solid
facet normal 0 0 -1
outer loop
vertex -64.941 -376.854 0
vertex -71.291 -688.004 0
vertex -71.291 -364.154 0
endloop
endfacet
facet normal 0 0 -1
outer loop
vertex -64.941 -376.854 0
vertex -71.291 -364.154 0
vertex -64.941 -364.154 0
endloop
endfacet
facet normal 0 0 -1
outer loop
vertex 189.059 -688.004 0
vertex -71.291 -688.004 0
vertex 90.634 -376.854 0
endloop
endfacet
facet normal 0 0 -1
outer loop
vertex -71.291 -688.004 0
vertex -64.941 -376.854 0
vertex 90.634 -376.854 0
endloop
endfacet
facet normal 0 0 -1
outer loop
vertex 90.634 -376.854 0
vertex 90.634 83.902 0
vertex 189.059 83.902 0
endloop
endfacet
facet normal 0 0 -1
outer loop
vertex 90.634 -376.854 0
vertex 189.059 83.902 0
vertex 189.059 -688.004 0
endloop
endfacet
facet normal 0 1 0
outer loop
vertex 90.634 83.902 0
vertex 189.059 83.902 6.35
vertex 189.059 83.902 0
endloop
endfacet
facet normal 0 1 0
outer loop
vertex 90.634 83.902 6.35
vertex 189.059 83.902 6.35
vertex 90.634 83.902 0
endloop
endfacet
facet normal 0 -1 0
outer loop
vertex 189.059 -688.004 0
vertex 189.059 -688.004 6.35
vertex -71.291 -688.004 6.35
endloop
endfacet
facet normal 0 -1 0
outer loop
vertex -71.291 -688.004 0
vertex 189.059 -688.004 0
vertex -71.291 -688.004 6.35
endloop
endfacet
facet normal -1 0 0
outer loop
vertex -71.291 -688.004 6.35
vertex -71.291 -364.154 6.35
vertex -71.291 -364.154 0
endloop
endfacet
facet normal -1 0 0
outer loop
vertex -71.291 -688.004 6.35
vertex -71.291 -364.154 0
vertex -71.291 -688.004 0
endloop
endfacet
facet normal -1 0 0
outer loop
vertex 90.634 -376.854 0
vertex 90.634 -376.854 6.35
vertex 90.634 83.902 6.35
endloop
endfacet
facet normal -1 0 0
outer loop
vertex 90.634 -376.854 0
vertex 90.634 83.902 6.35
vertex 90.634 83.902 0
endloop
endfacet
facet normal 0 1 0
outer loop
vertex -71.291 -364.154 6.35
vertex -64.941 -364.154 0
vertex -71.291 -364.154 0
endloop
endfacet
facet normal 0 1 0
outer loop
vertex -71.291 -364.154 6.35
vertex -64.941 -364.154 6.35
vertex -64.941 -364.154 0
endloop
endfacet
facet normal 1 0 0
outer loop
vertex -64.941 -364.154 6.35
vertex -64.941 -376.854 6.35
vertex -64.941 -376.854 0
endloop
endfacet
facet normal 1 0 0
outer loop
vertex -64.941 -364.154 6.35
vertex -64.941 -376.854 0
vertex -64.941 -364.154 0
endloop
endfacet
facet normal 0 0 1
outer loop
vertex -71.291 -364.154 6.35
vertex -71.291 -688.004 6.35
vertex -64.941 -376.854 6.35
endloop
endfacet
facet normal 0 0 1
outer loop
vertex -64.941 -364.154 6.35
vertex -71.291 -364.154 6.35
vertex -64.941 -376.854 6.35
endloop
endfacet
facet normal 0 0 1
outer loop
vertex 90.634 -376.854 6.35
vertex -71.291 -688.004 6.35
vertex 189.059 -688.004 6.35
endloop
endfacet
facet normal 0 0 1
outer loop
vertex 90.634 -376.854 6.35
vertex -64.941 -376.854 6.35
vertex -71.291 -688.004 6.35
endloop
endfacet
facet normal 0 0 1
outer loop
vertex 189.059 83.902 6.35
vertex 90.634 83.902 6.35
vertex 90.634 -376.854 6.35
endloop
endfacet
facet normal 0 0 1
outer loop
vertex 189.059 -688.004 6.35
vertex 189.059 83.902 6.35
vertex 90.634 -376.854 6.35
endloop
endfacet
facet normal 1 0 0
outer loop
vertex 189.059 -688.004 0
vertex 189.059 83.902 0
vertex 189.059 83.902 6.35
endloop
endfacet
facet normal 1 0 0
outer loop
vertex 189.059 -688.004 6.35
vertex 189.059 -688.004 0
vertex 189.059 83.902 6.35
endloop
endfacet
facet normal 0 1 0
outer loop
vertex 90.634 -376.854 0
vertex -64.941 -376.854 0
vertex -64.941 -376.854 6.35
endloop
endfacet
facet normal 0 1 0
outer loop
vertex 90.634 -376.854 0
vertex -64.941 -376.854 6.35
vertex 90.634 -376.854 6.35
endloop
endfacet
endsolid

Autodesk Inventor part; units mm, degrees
ref_plane "YZ Plane" through (0, 0, 0) normal (1, 0, 0) x (0, 1, 0)
ref_plane "XZ Plane" through (0, 0, 0) normal (0, 1, 0) x (-1, 0, 0)
ref_plane "XY Plane" through (0, 0, 0) normal (0, 0, 1) x (1, 0, 0)
sketch "Sketch1" plane through (0, 0, 0) normal (0, 0, 1) x (1, 0, 0)
  line L0 (-64.9406, 96.6023) -> (189.0594, 96.6023)
  line L1 (189.0594, 96.6023) -> (189.0594, -792.3977)
  line L2 (189.0594, -792.3977) -> (-64.9406, -792.3977)
  line L3 (-64.9406, -792.3977) -> (-64.9406, 96.6023)
  line L4 (-64.9406, 96.6023) -> (87.4594, 96.6023)
  line L5 (87.4594, 96.6023) -> (87.4594, -364.1537)
  line L6 (87.4594, -364.1537) -> (-64.9406, -364.1537)
  line L7 (-64.9406, -364.1537) -> (-64.9406, 96.6023)
  point P0 (0, 0)
  dimension "d0" = 254
  dimension "d1" = 889
  dimension "d2" = 152.4
  dimension "d3" = 460.756
extrude "Extrusion1" add sketch "Sketch1" along normal blind 6.35 contours L0 L1 L2 L3 L6 L5
sketch "Sketch2" plane through (-64.9406, -792.3977, 0) normal (-1, 0, 0) x (0, 0, 1)
  line L0 (6.35, 428.244) -> (0, 428.244) projected
  line L1 (0, 428.244) -> (0, 0) projected
  line L2 (0, 0) -> (6.35, 0) projected
  line L3 (6.35, 0) -> (6.35, 428.244) projected
  point P0 (0, 792.3977)
extrude "Extrusion2" add sketch "Sketch2" along normal blind 6.35
sketch "Sketch3" plane through (0, 0, 6.35) normal (0, 0, 1) x (1, 0, 0)
  line L0 (87.4594, 96.6023) -> (189.0594, 96.6023) projected
  line L1 (87.4594, -364.1537) -> (90.6344, -364.1537)
  line L2 (90.6344, -364.1537) -> (90.6344, 96.6023)
  line L3 (90.6344, 96.6023) -> (87.4594, 96.6023)
  line L4 (87.4594, 96.6023) -> (87.4594, -364.1537)
  point P0 (0, 0)
  dimension "d8" = 3.175
extrude "Extrusion3" cut sketch "Sketch3" against normal blind 6.35
sketch "Sketch4" plane through (189.0594, 96.6023, 6.35) normal (0, 1, 0) x (1, 0, 0)
  line L0 (-98.425, 6.35) -> (-98.425, 0) projected
  line L1 (-98.425, 0) -> (0, 0) projected
  line L2 (0, 6.35) -> (0, 0) projected
  line L3 (0, 6.35) -> (-98.425, 6.35) projected
  point P0 (-189.0594, 6.35)
extrude "Extrusion4" add sketch "Sketch4" along normal blind 6.35
sketch "Sketch5" plane through (189.0594, 102.9523, 6.35) normal (0, 1, 0) x (1, 0, 0)
  line L0 (-98.425, 6.35) -> (0, 6.35) projected
  line L1 (-98.425, 0) -> (-98.425, 6.35) projected
  line L2 (0, 0) -> (-98.425, 0) projected
  line L3 (0, 6.35) -> (0, 0) projected
  point P0 (-189.0594, 6.35)
extrude "Extrusion5" cut sketch "Sketch5" against normal blind 6.35
sketch "Sketch6" plane through (189.0594, 96.6023, 6.35) normal (0, 1, 0) x (1, 0, 0)
  line L0 (-98.425, 0) -> (-98.425, 6.35) projected
  line L1 (0, 0) -> (-98.425, 0) projected
  line L2 (0, 6.35) -> (0, 0) projected
  line L3 (-98.425, 6.35) -> (0, 6.35) projected
  point P0 (-189.0594, 6.35)
extrude "Extrusion6" add sketch "Sketch6" along normal blind 6.35
sketch "Sketch7" plane through (0, 0, 6.35) normal (0, 0, 1) x (1, 0, 0)
  line L0 (90.6344, -364.1537) -> (-71.2906, -364.1537) projected
  line L1 (-71.2906, -364.1537) -> (-71.2906, -792.3977) projected
  line L2 (189.0594, -792.3977) -> (-71.2906, -792.3977) projected
  line L3 (189.0594, 102.9523) -> (189.0594, -792.3977) projected
  line L4 (189.0594, 102.9523) -> (90.6344, 102.9523) projected
  line L5 (0, -364.1537) -> (0, -688.0037)
  line L6 (0, -688.0037) -> (-71.2906, -688.0037)
  line L7 (0, -688.0037) -> (189.0594, -688.0037)
  point P0 (0, 0)
  dimension "d17" = 323.85
extrude "Extrusion7" cut sketch "Sketch7" against normal blind 25.4 contours L7 L3 L2 L1 L6
sketch "Sketch8" plane through (0, 0, 0) normal (0, 0, -1) x (-1, 0, 0)
  line L0 (71.2906, -688.0037) -> (71.2906, -364.1537) projected
  line L1 (-90.6344, -364.1537) -> (71.2906, -364.1537)
  line L2 (71.2906, -364.1537) -> (71.2906, -376.8537)
  line L3 (71.2906, -376.8537) -> (-90.6344, -376.8537)
  line L4 (-90.6344, -376.8537) -> (-90.6344, -364.1537)
  point P0 (0, 0)
  dimension "d20" = 12.7
extrude "Extrusion8" cut sketch "Sketch8" against normal blind 25.4
sketch "Sketch9" plane through (0, 0, 6.35) normal (0, 0, 1) x (1, 0, 0)
  line L0 (-71.2906, -376.8537) -> (-64.9406, -376.8537)
  line L1 (-64.9406, -376.8537) -> (-64.9406, -364.1537)
  line L2 (-64.9406, -364.1537) -> (-71.2906, -364.1537)
  line L3 (-71.2906, -364.1537) -> (-71.2906, -376.8537)
  point P0 (0, 0)
  dimension "d23" = 6.35
  dimension "d24" = 12.7
extrude "Extrusion9" add sketch "Sketch9" against normal blind 6.35
sketch "Sketch10" plane through (0, 0, 6.35) normal (0, 0, 1) x (1, 0, 0)
  line L0 (189.0594, 102.9523) -> (189.0594, -688.0037) projected
  line L1 (189.0594, 102.9523) -> (90.6344, 102.9523) projected
  line L2 (90.6344, 102.9523) -> (189.0594, 102.9523)
  line L3 (189.0594, 102.9523) -> (189.0594, 83.9023)
  line L4 (189.0594, 83.9023) -> (90.6344, 83.9023)
  line L5 (90.6344, 83.9023) -> (90.6344, 102.9523)
  point P0 (0, 0)
  dimension "d27" = 19.05
extrude "Extrusion10" cut sketch "Sketch10" against normal blind 6.35
properties part number "side"
